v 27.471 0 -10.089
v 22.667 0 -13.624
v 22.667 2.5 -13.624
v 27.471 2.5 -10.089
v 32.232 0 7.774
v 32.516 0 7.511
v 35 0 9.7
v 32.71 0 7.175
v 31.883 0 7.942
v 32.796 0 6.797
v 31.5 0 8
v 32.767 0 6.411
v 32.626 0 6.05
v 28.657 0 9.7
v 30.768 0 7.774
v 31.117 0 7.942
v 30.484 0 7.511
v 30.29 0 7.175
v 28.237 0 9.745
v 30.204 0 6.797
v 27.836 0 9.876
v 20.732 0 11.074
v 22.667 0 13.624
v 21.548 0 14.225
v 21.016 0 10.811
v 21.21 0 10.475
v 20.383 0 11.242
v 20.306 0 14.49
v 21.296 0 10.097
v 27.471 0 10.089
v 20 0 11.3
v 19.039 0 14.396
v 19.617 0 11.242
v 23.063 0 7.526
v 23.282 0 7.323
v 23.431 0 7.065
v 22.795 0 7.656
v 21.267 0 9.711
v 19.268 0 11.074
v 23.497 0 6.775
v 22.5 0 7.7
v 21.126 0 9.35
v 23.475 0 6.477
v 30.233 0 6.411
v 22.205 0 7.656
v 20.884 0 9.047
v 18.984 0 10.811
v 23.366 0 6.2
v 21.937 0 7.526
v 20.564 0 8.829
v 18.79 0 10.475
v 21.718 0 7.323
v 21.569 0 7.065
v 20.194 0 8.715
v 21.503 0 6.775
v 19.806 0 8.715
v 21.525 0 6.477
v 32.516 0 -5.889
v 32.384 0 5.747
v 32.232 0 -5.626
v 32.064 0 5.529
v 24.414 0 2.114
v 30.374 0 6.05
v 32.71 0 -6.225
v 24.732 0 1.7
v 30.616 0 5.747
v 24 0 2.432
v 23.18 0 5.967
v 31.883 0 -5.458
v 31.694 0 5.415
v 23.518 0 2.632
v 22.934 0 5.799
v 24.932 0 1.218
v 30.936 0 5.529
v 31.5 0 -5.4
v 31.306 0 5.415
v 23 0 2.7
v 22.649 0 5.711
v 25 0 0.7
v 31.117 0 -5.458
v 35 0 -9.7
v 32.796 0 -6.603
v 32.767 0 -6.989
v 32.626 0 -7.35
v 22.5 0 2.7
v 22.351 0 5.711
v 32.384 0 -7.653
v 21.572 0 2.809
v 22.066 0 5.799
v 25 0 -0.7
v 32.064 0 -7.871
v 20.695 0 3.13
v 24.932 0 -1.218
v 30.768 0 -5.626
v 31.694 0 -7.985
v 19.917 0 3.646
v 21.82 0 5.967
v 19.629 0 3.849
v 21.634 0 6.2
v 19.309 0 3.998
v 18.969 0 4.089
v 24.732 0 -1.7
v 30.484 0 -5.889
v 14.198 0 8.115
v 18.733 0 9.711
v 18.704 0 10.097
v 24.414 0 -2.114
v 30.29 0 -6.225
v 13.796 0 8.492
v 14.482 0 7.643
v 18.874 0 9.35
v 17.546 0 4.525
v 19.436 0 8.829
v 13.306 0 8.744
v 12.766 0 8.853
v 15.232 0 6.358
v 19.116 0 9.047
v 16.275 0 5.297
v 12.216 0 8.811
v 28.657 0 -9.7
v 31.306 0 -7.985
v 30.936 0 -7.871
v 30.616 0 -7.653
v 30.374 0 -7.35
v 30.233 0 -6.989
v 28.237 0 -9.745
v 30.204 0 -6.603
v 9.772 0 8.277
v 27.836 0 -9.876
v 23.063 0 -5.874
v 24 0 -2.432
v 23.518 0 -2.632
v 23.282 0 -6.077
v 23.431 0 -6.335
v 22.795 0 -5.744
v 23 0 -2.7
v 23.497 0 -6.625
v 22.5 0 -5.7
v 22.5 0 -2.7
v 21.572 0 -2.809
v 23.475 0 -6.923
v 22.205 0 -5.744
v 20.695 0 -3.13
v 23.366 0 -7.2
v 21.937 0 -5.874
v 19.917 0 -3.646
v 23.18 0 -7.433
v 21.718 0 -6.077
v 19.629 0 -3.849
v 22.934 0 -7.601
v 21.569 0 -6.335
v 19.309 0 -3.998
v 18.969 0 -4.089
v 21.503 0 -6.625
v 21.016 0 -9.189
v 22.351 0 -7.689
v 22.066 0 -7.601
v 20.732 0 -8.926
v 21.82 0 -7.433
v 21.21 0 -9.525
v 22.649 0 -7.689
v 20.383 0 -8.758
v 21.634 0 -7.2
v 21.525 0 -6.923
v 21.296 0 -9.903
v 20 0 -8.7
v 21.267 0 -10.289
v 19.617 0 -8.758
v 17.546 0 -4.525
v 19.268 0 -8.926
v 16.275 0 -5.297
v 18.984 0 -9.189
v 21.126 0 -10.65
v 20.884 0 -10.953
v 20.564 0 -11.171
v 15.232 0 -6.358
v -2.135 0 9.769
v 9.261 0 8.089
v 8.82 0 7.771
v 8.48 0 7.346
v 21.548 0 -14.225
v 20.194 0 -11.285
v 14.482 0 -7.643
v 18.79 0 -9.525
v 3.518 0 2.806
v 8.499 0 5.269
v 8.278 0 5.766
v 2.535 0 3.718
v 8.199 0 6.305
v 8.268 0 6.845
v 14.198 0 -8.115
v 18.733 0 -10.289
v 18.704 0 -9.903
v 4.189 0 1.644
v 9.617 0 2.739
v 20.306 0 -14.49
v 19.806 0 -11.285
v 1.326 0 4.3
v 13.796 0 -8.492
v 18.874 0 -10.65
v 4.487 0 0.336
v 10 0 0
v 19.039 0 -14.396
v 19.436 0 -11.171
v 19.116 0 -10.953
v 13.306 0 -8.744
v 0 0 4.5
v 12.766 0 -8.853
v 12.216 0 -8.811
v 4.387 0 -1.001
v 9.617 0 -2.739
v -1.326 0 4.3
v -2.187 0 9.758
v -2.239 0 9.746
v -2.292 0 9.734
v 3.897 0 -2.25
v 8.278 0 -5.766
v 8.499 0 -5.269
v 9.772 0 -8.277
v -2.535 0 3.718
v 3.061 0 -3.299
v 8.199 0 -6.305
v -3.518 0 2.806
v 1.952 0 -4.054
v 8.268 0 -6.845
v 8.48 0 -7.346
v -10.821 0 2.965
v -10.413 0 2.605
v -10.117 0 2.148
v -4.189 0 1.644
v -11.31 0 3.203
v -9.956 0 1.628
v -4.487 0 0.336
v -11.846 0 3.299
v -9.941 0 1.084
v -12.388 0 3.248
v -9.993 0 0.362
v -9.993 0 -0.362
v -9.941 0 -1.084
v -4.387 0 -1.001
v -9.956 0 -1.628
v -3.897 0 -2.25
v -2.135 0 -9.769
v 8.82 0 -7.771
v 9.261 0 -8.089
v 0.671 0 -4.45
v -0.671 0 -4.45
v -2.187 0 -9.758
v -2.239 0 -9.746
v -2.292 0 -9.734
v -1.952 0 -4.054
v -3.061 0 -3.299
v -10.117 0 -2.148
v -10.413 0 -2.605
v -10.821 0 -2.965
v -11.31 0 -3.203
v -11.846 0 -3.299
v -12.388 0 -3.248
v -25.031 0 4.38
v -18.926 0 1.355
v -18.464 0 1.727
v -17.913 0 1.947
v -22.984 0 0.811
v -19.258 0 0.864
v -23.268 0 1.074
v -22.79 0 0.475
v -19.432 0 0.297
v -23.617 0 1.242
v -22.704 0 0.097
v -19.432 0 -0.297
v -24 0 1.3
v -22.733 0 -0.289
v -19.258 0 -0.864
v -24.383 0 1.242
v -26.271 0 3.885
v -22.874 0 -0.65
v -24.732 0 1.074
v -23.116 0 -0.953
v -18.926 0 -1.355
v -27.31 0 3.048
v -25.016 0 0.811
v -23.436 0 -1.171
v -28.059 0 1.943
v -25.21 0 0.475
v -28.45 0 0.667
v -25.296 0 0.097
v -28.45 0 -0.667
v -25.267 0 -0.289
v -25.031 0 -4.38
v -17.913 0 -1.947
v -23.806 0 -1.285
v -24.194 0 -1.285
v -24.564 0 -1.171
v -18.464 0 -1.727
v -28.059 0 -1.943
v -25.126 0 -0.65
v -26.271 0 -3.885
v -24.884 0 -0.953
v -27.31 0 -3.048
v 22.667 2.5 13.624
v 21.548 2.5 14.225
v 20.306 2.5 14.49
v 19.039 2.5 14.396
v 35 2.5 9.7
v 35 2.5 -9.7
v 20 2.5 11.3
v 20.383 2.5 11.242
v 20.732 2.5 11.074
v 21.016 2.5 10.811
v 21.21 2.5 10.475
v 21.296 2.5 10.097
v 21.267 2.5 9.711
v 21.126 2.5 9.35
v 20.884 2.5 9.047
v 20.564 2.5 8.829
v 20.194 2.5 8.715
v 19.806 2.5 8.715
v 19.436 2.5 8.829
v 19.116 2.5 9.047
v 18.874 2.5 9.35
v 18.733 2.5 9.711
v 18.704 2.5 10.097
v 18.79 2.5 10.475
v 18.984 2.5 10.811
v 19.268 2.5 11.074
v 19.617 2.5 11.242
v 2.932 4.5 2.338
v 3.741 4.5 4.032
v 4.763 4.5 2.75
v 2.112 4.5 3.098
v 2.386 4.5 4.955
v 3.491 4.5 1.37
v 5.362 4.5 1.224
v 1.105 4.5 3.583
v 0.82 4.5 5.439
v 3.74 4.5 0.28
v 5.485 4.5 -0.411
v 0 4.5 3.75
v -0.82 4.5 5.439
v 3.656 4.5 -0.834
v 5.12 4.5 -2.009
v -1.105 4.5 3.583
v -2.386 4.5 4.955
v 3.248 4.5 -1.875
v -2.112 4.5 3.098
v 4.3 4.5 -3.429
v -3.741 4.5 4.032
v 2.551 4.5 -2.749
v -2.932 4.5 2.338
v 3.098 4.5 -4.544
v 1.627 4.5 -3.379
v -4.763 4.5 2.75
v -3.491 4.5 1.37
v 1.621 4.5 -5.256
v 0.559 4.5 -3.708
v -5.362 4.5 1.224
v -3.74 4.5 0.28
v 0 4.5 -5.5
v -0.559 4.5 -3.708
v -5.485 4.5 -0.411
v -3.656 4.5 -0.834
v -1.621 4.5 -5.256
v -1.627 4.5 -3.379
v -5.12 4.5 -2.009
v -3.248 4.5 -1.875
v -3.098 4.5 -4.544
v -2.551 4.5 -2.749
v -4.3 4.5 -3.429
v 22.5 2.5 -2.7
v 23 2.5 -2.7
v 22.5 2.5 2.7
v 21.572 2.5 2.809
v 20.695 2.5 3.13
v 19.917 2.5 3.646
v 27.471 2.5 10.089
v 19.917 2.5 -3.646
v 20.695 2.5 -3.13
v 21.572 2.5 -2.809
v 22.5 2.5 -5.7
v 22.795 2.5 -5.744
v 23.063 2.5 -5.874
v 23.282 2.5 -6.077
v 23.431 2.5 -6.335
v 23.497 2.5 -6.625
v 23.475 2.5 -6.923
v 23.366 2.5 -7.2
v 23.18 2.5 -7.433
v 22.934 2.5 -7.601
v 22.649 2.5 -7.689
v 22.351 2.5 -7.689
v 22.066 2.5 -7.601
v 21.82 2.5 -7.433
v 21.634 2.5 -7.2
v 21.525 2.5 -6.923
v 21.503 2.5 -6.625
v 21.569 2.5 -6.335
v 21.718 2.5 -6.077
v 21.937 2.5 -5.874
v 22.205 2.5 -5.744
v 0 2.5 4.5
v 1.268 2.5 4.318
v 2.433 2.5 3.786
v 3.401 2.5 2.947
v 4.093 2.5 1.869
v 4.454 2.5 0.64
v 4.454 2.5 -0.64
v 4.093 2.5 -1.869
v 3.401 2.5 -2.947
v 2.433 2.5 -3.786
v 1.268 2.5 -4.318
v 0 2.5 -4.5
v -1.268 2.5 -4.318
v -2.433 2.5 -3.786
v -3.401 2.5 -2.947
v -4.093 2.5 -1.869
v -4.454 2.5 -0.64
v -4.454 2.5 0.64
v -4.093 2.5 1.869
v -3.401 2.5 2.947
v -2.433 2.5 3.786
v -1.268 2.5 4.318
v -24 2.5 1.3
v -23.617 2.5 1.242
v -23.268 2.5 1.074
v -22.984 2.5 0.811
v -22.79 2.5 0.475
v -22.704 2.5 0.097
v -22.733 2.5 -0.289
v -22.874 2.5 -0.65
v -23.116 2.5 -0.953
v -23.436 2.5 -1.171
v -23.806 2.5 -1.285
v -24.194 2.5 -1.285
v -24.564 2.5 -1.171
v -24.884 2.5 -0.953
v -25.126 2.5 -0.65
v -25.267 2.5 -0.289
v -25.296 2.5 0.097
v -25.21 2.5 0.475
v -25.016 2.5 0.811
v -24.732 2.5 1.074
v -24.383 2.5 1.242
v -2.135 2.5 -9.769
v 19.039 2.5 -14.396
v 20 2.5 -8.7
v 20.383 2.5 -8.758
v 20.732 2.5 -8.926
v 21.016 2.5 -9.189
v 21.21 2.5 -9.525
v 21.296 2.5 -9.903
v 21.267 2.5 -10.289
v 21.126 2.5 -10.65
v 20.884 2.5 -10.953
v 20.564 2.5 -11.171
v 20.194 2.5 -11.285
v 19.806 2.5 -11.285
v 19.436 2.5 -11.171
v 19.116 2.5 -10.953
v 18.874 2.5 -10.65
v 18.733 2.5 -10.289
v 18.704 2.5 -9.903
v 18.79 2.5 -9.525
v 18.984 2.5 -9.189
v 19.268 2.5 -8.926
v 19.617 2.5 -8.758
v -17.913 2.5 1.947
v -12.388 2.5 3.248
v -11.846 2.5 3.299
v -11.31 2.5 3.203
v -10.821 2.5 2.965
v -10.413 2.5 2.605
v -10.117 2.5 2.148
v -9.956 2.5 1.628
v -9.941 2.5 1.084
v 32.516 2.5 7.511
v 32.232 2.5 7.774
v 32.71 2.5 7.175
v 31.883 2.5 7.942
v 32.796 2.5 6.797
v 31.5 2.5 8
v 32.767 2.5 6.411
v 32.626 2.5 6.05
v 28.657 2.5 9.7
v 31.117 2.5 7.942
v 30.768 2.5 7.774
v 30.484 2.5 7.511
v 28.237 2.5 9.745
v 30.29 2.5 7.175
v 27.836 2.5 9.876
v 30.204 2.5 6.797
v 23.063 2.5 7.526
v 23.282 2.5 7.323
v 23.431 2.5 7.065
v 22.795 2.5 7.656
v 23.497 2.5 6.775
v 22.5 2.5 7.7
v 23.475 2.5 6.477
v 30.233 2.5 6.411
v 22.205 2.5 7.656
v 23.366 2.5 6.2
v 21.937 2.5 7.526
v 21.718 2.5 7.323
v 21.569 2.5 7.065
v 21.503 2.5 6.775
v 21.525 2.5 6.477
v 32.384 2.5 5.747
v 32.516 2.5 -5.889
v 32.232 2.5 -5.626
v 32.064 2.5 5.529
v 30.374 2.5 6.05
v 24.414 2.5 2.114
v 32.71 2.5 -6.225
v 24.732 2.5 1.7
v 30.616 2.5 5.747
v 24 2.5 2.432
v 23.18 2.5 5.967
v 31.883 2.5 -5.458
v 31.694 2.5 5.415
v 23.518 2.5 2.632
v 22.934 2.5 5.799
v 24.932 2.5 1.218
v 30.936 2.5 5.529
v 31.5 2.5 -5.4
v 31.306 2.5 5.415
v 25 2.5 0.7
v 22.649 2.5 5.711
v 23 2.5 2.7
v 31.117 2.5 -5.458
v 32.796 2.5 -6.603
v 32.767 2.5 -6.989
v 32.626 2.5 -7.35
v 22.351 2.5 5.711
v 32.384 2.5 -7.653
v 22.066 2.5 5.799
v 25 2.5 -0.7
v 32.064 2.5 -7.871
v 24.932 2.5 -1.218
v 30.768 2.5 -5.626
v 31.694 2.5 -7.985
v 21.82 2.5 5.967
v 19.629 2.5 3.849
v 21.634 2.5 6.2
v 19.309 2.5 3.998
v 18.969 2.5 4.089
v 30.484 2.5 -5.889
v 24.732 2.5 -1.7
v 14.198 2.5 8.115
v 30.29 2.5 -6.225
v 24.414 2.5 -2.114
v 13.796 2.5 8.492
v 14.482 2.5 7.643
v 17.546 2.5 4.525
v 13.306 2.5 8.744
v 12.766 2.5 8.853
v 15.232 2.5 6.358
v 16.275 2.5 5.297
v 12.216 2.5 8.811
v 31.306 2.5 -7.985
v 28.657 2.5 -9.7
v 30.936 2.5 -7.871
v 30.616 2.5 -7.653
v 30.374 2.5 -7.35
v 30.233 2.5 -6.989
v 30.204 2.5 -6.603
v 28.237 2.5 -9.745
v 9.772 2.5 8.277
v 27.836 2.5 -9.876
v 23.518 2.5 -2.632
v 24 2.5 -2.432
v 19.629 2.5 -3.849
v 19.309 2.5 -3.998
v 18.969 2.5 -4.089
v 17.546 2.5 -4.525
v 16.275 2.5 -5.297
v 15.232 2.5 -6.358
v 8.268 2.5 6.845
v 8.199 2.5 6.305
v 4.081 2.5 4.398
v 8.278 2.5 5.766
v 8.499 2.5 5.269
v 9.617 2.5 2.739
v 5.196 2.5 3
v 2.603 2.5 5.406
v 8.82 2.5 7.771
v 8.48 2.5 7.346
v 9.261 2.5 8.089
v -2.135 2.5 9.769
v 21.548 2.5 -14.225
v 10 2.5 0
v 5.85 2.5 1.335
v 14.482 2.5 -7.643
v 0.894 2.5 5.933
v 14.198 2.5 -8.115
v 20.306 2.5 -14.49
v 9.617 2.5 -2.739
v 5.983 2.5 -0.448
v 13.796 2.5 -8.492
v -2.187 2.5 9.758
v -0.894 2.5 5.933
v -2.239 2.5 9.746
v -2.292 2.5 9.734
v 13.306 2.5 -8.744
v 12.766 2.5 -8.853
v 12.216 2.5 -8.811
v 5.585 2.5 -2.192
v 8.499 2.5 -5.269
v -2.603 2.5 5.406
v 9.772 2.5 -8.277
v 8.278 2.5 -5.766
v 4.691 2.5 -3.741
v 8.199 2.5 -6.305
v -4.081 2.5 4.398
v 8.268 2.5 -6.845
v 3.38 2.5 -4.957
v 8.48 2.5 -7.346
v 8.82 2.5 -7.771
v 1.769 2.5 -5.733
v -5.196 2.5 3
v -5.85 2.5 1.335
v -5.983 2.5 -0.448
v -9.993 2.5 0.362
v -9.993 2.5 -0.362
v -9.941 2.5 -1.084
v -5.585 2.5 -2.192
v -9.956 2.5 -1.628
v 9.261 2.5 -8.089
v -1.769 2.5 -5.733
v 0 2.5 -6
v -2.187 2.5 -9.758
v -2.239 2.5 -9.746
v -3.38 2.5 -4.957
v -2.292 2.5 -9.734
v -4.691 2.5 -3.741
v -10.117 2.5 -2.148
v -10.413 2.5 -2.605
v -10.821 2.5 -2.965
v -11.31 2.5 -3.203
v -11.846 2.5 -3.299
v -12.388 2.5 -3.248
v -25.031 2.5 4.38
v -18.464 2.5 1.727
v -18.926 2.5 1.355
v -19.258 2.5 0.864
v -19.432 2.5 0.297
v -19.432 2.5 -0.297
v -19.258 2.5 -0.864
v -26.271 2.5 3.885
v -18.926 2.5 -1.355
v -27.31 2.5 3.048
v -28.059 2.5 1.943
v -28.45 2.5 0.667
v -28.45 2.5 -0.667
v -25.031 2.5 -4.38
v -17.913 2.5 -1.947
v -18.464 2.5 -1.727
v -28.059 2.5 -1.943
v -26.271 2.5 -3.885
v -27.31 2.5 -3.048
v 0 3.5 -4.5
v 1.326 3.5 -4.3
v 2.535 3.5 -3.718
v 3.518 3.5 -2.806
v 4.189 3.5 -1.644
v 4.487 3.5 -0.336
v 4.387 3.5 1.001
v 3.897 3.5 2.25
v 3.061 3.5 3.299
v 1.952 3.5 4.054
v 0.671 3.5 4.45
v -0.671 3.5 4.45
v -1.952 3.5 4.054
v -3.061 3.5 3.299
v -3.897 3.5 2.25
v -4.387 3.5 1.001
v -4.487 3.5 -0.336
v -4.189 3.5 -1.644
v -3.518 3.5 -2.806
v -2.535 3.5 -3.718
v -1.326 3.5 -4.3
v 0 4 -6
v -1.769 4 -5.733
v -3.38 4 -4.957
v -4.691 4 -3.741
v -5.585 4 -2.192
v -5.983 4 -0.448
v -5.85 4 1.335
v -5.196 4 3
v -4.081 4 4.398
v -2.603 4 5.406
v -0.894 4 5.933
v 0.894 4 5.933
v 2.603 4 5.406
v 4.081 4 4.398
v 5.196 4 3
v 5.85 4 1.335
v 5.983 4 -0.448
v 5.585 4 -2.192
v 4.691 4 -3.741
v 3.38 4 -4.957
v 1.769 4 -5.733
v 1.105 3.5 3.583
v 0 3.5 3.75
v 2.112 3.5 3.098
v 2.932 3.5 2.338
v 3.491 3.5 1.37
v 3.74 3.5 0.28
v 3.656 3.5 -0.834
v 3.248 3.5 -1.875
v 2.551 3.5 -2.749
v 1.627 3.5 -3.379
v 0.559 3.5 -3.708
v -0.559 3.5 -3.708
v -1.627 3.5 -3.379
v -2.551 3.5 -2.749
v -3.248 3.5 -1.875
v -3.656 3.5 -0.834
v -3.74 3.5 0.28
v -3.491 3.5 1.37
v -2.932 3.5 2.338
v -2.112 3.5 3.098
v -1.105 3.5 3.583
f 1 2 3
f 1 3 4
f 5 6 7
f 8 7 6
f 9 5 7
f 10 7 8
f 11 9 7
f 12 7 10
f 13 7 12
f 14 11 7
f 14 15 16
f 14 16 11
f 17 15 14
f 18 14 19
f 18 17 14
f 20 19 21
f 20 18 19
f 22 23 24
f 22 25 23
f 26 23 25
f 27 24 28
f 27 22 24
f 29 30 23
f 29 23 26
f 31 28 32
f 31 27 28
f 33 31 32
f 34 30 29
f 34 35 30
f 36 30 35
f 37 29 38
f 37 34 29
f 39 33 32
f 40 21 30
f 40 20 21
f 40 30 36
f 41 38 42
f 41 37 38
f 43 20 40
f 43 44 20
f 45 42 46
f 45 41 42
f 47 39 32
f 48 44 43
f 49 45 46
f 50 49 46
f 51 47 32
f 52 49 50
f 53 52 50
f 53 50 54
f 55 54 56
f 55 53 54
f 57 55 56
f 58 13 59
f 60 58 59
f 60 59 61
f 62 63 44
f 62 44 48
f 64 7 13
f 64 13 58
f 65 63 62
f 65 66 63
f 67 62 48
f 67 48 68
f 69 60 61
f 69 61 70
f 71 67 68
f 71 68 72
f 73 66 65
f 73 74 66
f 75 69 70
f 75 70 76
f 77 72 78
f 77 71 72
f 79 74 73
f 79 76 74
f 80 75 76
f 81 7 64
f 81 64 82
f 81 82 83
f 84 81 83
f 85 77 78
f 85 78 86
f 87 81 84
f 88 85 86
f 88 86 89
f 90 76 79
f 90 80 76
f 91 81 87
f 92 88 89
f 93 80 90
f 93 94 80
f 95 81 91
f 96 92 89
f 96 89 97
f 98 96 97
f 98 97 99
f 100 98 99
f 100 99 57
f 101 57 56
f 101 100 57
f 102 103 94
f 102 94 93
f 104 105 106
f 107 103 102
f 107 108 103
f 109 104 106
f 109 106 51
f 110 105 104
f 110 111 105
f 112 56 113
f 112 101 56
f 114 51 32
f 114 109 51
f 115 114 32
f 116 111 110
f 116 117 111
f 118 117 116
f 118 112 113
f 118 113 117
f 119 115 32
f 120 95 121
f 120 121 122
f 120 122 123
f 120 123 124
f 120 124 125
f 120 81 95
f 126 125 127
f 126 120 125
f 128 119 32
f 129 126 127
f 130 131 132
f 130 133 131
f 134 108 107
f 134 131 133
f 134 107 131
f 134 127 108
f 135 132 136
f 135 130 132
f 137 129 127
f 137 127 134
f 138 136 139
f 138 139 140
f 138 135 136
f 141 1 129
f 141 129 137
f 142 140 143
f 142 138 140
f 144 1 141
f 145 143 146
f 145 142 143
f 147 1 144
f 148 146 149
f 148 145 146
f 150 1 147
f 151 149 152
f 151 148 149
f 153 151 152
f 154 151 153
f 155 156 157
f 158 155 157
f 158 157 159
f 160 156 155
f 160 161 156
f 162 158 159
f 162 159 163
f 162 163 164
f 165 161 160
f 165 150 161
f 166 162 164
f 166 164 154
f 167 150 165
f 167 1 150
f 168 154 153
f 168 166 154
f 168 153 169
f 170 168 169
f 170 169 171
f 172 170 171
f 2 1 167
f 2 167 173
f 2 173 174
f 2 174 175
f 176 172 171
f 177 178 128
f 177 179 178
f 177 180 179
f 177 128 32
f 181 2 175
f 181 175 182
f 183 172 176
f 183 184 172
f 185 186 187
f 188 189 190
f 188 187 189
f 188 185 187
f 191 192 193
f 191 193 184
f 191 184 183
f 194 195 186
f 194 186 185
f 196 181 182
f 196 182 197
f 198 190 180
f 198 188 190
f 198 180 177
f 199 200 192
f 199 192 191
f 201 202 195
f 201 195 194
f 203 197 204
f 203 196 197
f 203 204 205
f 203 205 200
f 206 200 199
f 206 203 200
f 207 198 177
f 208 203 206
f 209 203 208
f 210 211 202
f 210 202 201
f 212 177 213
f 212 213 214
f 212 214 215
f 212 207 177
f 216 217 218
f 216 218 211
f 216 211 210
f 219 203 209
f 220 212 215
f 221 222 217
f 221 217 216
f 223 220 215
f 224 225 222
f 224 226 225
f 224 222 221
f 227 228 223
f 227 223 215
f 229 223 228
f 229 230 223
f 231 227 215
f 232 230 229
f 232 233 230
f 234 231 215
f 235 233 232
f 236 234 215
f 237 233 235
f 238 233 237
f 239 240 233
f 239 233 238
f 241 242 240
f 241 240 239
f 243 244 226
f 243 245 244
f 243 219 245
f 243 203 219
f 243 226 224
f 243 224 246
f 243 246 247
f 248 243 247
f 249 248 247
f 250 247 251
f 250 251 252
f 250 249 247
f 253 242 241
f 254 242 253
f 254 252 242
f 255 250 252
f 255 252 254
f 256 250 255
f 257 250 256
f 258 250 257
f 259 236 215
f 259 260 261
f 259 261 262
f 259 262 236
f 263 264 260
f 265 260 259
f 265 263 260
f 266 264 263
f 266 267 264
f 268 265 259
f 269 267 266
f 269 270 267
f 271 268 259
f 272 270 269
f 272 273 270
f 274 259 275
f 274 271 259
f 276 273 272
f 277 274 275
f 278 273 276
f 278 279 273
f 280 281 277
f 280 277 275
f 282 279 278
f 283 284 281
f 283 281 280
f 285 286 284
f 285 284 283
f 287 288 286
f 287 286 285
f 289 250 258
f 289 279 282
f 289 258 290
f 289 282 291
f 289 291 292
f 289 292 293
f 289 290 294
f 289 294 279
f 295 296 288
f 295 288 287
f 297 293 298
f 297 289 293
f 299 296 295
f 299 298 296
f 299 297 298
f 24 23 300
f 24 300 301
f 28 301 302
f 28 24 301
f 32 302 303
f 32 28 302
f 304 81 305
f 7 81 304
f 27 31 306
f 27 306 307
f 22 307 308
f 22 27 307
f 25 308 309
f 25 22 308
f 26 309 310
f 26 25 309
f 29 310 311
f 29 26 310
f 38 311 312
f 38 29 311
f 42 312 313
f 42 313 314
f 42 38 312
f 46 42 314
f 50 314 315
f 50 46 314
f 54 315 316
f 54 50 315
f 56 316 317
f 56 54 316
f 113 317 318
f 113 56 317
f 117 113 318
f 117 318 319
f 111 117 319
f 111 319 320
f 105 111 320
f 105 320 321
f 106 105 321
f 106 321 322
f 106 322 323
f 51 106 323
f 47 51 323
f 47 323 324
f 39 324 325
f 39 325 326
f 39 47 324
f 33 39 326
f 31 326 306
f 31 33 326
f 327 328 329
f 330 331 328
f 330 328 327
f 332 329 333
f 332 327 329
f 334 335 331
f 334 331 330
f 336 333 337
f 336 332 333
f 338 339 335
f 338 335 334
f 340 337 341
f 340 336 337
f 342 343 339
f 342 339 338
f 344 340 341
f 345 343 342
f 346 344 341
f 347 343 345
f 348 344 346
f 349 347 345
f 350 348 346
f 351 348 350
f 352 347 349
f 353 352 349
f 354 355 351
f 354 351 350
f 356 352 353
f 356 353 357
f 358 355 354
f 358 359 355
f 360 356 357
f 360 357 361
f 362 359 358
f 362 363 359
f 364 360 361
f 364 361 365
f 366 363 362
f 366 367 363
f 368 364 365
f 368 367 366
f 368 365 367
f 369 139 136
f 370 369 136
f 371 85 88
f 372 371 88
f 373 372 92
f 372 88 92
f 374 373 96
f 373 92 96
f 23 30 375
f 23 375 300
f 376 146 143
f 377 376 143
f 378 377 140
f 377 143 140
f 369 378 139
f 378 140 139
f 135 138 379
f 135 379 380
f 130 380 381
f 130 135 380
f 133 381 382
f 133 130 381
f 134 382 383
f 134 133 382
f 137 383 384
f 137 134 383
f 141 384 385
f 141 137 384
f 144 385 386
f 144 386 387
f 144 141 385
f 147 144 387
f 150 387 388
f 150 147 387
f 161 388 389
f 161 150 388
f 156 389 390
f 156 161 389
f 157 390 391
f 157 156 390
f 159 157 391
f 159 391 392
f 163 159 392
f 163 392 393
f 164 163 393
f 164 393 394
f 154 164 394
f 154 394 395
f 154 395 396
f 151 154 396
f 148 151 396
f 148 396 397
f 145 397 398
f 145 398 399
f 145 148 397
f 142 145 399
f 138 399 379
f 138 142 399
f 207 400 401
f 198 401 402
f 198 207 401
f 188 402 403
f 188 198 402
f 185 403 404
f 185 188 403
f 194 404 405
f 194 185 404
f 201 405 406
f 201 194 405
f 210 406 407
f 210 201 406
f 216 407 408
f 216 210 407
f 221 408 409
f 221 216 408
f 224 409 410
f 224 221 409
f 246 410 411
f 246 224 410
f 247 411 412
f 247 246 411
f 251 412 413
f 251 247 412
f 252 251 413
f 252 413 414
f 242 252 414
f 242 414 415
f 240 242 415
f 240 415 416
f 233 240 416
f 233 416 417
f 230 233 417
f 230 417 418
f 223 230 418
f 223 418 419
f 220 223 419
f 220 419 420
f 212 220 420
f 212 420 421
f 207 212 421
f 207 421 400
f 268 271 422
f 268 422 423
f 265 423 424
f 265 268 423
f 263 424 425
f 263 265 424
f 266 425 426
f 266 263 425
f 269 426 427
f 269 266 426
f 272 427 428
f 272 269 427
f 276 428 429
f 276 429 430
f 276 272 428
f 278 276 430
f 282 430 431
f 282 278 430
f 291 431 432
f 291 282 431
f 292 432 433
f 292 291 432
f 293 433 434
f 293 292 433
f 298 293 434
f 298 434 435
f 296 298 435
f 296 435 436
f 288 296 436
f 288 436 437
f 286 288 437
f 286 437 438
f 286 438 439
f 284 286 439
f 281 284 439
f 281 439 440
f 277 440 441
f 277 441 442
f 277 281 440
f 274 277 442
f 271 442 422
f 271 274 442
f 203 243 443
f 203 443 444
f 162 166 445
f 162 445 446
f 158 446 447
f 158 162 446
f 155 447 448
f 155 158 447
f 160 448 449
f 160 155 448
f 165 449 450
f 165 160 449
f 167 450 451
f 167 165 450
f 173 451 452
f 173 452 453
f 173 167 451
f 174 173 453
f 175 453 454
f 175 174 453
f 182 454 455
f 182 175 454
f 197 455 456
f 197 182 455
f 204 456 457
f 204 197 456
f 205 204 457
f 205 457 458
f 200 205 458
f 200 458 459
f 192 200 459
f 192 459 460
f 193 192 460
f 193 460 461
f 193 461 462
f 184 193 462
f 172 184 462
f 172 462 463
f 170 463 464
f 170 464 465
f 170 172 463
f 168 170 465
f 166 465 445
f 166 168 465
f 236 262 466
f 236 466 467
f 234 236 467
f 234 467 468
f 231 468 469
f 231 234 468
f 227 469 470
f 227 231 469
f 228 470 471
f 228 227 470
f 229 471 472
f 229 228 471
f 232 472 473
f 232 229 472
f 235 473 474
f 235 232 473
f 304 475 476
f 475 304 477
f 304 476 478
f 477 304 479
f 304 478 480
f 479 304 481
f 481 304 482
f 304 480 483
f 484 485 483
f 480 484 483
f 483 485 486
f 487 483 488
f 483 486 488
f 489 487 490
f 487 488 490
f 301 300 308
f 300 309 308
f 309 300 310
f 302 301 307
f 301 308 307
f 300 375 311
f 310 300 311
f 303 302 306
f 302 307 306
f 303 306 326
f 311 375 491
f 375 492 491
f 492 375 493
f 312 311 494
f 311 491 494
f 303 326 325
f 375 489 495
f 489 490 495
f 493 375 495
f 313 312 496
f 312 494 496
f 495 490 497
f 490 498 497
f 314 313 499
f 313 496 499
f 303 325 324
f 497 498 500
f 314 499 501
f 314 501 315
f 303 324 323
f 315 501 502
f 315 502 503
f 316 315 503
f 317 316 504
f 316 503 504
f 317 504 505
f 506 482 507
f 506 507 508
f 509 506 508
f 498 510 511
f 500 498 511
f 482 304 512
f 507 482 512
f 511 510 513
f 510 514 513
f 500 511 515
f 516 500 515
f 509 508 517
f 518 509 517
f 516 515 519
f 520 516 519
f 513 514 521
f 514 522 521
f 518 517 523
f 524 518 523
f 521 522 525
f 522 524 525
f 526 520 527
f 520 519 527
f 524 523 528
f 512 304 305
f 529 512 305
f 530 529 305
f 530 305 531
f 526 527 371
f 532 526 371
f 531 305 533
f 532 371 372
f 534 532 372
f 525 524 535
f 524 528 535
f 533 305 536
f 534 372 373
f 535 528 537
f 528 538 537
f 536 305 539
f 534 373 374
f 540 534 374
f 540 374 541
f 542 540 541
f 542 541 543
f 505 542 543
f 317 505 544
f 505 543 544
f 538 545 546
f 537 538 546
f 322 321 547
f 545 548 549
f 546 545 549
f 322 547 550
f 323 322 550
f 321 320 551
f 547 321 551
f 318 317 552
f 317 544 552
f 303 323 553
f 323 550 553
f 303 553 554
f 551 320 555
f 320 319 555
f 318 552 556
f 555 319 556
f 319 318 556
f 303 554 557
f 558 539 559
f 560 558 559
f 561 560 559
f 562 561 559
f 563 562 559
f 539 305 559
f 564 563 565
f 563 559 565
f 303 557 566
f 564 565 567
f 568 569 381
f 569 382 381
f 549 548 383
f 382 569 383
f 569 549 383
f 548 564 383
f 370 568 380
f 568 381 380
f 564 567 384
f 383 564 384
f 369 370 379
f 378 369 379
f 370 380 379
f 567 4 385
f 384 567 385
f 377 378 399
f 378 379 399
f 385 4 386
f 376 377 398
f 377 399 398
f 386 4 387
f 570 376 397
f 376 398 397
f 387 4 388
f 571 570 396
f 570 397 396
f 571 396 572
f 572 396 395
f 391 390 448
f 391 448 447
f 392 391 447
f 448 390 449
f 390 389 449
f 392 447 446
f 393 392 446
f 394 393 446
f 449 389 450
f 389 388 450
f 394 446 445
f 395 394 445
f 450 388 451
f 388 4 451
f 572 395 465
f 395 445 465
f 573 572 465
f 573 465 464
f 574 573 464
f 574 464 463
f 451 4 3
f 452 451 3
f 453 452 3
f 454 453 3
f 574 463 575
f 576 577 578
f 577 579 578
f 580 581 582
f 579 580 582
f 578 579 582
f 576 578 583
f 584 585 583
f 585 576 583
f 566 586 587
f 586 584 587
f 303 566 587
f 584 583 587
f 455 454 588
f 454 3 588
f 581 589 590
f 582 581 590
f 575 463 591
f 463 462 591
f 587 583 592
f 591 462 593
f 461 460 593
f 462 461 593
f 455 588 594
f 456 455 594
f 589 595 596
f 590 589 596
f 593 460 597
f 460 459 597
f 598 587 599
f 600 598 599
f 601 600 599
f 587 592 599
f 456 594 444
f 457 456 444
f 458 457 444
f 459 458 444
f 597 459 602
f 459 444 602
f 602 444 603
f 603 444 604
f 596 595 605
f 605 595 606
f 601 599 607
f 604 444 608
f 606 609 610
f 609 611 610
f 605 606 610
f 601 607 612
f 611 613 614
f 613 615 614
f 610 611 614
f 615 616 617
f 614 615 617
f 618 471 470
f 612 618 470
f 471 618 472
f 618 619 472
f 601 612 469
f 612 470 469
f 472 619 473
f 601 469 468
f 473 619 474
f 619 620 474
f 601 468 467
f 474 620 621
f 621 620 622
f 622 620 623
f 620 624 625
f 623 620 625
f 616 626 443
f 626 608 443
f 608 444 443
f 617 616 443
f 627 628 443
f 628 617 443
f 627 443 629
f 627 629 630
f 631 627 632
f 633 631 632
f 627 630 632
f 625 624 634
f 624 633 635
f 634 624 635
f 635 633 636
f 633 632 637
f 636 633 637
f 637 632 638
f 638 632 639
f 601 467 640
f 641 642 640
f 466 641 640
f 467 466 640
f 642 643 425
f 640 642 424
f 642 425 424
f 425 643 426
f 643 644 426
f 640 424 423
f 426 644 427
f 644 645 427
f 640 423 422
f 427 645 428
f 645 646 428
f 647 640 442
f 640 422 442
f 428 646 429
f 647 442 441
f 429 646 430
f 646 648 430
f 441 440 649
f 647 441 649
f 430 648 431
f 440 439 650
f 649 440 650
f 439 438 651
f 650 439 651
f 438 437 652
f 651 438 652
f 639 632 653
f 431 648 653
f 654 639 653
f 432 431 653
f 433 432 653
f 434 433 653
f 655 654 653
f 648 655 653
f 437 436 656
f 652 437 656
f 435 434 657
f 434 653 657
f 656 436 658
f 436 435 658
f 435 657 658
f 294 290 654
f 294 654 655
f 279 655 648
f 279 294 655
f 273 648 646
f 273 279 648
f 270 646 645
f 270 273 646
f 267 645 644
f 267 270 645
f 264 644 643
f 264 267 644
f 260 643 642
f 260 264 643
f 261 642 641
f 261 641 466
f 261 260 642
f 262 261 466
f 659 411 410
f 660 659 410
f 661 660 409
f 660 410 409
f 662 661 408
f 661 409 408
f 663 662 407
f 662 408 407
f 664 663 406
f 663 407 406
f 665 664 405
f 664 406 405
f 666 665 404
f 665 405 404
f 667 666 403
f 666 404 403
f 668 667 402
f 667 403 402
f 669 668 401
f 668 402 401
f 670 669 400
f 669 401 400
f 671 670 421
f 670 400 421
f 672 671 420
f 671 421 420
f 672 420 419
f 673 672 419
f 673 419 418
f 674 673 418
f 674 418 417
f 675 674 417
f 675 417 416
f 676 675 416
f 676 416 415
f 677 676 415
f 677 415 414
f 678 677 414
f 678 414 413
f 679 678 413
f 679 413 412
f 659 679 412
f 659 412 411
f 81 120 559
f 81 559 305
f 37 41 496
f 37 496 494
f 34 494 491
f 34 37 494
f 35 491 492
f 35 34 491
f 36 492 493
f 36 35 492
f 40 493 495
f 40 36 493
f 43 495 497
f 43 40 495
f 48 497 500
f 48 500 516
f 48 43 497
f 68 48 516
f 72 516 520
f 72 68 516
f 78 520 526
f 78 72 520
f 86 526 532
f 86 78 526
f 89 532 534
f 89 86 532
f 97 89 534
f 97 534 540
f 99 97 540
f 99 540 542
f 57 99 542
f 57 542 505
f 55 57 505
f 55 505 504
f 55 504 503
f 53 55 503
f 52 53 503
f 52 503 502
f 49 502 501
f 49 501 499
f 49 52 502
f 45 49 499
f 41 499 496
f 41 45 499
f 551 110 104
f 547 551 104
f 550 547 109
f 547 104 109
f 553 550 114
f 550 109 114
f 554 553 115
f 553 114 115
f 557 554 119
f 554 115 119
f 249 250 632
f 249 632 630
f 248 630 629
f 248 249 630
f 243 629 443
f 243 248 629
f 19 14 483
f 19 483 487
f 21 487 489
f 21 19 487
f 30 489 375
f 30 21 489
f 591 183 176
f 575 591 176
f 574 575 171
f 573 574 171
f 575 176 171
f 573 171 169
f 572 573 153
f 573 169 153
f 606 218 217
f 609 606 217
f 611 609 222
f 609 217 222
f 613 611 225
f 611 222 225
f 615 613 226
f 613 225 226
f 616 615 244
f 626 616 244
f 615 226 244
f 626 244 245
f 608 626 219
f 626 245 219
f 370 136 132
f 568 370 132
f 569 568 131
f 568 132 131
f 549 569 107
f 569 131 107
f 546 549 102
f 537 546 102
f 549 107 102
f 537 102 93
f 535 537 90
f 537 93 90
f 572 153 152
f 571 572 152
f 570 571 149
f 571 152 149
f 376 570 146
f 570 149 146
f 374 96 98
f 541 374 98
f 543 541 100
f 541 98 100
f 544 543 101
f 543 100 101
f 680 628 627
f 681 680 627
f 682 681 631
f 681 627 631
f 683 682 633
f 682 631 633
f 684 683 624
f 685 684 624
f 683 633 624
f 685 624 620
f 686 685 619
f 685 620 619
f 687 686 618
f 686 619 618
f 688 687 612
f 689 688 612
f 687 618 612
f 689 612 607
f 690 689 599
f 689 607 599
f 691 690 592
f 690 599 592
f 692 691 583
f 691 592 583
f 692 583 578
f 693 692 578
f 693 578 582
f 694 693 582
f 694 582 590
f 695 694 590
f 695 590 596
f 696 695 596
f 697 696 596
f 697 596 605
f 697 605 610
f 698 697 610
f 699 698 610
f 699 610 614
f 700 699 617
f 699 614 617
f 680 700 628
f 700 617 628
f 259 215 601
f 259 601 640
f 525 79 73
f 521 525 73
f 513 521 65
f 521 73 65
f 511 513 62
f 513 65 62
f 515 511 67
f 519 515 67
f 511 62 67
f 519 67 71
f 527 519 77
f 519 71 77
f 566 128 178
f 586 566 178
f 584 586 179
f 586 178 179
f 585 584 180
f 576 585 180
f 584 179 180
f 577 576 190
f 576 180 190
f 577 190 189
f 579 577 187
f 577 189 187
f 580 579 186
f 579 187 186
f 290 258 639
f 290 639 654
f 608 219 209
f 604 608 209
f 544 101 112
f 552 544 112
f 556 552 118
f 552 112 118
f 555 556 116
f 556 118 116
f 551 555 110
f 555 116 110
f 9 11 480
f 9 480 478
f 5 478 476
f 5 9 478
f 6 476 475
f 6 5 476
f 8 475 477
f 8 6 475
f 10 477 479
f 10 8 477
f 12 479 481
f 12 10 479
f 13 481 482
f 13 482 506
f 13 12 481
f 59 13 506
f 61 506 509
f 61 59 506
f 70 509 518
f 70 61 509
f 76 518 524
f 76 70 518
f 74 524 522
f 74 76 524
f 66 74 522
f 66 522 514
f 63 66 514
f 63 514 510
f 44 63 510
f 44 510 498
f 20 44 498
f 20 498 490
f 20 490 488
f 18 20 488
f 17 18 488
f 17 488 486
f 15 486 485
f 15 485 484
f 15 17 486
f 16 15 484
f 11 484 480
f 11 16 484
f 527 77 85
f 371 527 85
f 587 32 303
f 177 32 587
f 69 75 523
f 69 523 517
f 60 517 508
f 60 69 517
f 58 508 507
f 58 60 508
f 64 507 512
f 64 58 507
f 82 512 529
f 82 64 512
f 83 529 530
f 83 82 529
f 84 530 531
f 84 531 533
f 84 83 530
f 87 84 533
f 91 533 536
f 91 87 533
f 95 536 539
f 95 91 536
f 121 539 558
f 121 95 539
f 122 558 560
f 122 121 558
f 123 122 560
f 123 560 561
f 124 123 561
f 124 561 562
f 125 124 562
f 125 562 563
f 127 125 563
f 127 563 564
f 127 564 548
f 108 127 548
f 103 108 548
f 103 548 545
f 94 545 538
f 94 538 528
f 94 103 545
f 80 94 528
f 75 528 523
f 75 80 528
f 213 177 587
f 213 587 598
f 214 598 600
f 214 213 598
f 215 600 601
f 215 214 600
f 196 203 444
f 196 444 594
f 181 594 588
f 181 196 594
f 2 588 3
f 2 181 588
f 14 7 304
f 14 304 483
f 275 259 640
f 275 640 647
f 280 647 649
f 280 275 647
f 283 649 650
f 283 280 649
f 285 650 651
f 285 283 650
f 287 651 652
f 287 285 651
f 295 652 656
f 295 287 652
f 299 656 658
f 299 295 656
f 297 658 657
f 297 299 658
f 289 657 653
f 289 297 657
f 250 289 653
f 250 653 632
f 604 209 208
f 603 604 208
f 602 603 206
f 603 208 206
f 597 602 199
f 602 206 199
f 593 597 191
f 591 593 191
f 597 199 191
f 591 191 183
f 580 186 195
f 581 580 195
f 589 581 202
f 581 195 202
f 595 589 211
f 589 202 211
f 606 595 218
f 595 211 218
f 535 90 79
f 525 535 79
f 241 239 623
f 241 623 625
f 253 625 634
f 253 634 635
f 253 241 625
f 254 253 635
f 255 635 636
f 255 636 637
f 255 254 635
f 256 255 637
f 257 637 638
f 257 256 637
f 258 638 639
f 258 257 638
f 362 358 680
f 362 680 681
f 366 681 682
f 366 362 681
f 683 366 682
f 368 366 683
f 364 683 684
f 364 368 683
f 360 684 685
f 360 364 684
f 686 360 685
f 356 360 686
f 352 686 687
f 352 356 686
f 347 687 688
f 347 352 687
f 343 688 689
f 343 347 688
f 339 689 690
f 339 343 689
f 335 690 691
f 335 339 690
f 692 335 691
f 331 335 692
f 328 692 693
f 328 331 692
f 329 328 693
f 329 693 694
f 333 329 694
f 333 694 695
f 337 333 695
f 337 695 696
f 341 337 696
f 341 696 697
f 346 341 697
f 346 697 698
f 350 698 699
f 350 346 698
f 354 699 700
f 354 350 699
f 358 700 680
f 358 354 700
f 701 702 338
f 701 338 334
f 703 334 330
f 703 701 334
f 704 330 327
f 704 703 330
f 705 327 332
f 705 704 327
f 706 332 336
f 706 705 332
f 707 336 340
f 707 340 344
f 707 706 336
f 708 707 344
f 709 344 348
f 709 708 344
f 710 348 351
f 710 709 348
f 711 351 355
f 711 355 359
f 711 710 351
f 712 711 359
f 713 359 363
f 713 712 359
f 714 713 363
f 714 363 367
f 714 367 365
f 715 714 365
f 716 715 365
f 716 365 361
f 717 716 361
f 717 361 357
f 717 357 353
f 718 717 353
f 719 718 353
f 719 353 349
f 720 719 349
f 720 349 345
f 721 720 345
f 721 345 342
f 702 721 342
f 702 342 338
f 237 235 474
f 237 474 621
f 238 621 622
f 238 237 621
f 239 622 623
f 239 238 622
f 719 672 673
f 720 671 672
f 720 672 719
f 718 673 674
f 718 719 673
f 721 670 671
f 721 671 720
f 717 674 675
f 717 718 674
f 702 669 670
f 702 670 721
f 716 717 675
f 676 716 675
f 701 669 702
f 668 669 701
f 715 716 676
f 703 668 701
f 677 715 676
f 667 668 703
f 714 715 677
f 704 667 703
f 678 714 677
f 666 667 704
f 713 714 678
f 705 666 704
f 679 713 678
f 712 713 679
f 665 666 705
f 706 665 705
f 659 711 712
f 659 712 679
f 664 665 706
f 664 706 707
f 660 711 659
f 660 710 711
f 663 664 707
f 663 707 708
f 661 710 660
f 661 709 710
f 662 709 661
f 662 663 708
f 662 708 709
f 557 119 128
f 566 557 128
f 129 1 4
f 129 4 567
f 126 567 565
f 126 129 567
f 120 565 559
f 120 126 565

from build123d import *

# Parameters (mm, degrees)
SKETCH1_R           = 1.3
SKETCH1_R_2         = 4.5
SKETCH1_R_3         = 1
BOSS_EXTRUDE1_DEPTH = 2.5
SKETCH3_R           = 6
SKETCH3_R_2         = 3.75
BOSS_EXTRUDE2_DEPTH = 2
SKETCH4_R           = 4.5
SKETCH4_R_2         = 3.75
CUT_EXTRUDE1_DEPTH  = 1
CHAMFER1_SIZE       = 0.5


with BuildPart() as part:
    # Sketch1 → Boss-Extrude1 (new body)
    with BuildSketch(Plane(origin=(0, 0, 0), x_dir=(1, 0, 0), z_dir=(0, 1, 0))):
        with BuildLine():
            Line((35, 9.7), (35, -9.7))
            Line((35, -9.7), (28.656580513, -9.7))
            ThreePointArc((28.656580513, -9.7), (28.032756183, -9.799778117), (27.471175871, -10.089156794))
            Line((27.471175871, -10.089156794), (22.667160445, -13.62438739))
            ThreePointArc((22.667160445, -13.62438739), (20.936486005, -14.401466515), (19.039367435, -14.396259626))
            Line((19.039367435, -14.396259626), (-2.134739034, -9.769487666))
            ThreePointArc((-2.134739034, -9.769487666), (-2.213274492, -9.751995489), (-2.291666667, -9.733871989))
            Line((-2.291666667, -9.733871989), (-25.03125, -4.380242395))
            ThreePointArc((-25.03125, -4.380242395), (-28.5, 0), (-25.03125, 4.380242395))
            Line((-25.03125, 4.380242395), (-2.291666667, 9.733871989))
            ThreePointArc((-2.291666667, 9.733871989), (-2.213276651, 9.751994999), (-2.13474336, 9.769486721))
            Line((-2.13474336, 9.769486721), (19.039365488, 14.396269024))
            ThreePointArc((19.039365488, 14.396269024), (20.936487661, 14.401475987), (22.667164776, 13.624394026))
            Line((22.667164776, 13.624394026), (27.47117527, 10.089158211))
            ThreePointArc((27.47117527, 10.089158211), (28.032756372, 9.799778489), (28.656581837, 9.7))
            Line((28.656581837, 9.7), (35, 9.7))
        make_face()
        with Locations((31.5, 6.7)):
            Circle(SKETCH1_R, mode=Mode.SUBTRACT)
        with Locations((31.5, -6.7)):
            Circle(SKETCH1_R, mode=Mode.SUBTRACT)
        with Locations((20, 10)):
            Circle(SKETCH1_R, mode=Mode.SUBTRACT)
        with Locations((20, -9.999990176)):
            Circle(SKETCH1_R, mode=Mode.SUBTRACT)
        Circle(SKETCH1_R_2, mode=Mode.SUBTRACT)
        with Locations((-24, 0)):
            Circle(SKETCH1_R, mode=Mode.SUBTRACT)
        with Locations((22.5, -6.7)):
            Circle(SKETCH1_R_3, mode=Mode.SUBTRACT)
        with Locations((22.5, 6.7)):
            Circle(SKETCH1_R_3, mode=Mode.SUBTRACT)
        with BuildLine():
            Line((9.772066478, 8.276878442), (12.216286037, 8.810968065))
            ThreePointArc((12.216286037, 8.810968065), (13.559618748, 8.634777191), (14.482426032, 7.642803041))
            ThreePointArc((14.482426032, 7.642803041), (16.274630398, 5.296637232), (18.968838896, 4.089271891))
            ThreePointArc((18.968838896, 4.089271891), (19.472295347, 3.930738723), (19.916745685, 3.646019459))
            ThreePointArc((19.916745685, 3.646019459), (21.124485944, 2.943943413), (22.5, 2.7))
            Line((22.5, 2.7), (23, 2.7))
            ThreePointArc((23, 2.7), (24.414213562, 2.114213562), (25, 0.7))
            Line((25, 0.7), (25, -0.7))
            ThreePointArc((25, -0.7), (24.414213562, -2.114213562), (23, -2.7))
            Line((23, -2.7), (22.5, -2.7))
            ThreePointArc((22.5, -2.7), (21.124485854, -2.943943446), (19.916745538, -3.646019583))
            ThreePointArc((19.916745538, -3.646019583), (19.472295389, -3.930738787), (18.968839153, -4.089271995))
            ThreePointArc((18.968839153, -4.089271995), (16.274635438, -5.296635948), (14.482434575, -7.642798226))
            ThreePointArc((14.482434575, -7.642798226), (13.559627706, -8.634772461), (12.216295281, -8.810963823))
            Line((12.216295281, -8.810963823), (9.772070143, -8.276874115))
            ThreePointArc((9.772070143, -8.276874115), (8.357168863, -7.102458424), (8.499181625, -5.269147152))
            ThreePointArc((8.499181625, -5.269147152), (10, 2.214e-06), (8.499179292, 5.269150915))
            ThreePointArc((8.499179292, 5.269150915), (8.357165718, 7.102462125), (9.772066478, 8.276878442))
        make_face(mode=Mode.SUBTRACT)
        with BuildLine():
            Line((-17.912878788, -1.946774398), (-12.387619024, -3.247598329))
            ThreePointArc((-12.387619024, -3.247598329), (-10.604369925, -2.799022253), (-9.941071409, -1.084019943))
            ThreePointArc((-9.941071409, -1.084019943), (-10, 0), (-9.941071409, 1.084019943))
            ThreePointArc((-9.941071409, 1.084019943), (-10.604369925, 2.799022253), (-12.387619024, 3.247598329))
            Line((-12.387619024, 3.247598329), (-17.912878788, 1.946774398))
            ThreePointArc((-17.912878788, 1.946774398), (-19.454545455, 0), (-17.912878788, -1.946774398))
        make_face(mode=Mode.SUBTRACT)
    extrude(amount=BOSS_EXTRUDE1_DEPTH)

    # Sketch3 → Boss-Extrude2 (add)
    with BuildSketch(Plane(origin=(0, 2.5, 0), x_dir=(1, 0, 0), z_dir=(0, 1, 0))):
        Circle(SKETCH3_R)
        Circle(SKETCH3_R_2, mode=Mode.SUBTRACT)
    extrude(amount=BOSS_EXTRUDE2_DEPTH)

    # Sketch4 → Cut-Extrude1 (cut)
    with BuildSketch(Plane.XZ.offset(-2.5)):
        Circle(SKETCH4_R)
        Circle(SKETCH4_R_2, mode=Mode.SUBTRACT)
    extrude(amount=-CUT_EXTRUDE1_DEPTH, mode=Mode.SUBTRACT)

    # Chamfer1
    chamfer1_edges = [part.edges().sort_by_distance(p)[0] for p in [
        (-6, 4.5, 0),
    ]]
    chamfer(chamfer1_edges, length=CHAMFER1_SIZE)


solid = part.part
